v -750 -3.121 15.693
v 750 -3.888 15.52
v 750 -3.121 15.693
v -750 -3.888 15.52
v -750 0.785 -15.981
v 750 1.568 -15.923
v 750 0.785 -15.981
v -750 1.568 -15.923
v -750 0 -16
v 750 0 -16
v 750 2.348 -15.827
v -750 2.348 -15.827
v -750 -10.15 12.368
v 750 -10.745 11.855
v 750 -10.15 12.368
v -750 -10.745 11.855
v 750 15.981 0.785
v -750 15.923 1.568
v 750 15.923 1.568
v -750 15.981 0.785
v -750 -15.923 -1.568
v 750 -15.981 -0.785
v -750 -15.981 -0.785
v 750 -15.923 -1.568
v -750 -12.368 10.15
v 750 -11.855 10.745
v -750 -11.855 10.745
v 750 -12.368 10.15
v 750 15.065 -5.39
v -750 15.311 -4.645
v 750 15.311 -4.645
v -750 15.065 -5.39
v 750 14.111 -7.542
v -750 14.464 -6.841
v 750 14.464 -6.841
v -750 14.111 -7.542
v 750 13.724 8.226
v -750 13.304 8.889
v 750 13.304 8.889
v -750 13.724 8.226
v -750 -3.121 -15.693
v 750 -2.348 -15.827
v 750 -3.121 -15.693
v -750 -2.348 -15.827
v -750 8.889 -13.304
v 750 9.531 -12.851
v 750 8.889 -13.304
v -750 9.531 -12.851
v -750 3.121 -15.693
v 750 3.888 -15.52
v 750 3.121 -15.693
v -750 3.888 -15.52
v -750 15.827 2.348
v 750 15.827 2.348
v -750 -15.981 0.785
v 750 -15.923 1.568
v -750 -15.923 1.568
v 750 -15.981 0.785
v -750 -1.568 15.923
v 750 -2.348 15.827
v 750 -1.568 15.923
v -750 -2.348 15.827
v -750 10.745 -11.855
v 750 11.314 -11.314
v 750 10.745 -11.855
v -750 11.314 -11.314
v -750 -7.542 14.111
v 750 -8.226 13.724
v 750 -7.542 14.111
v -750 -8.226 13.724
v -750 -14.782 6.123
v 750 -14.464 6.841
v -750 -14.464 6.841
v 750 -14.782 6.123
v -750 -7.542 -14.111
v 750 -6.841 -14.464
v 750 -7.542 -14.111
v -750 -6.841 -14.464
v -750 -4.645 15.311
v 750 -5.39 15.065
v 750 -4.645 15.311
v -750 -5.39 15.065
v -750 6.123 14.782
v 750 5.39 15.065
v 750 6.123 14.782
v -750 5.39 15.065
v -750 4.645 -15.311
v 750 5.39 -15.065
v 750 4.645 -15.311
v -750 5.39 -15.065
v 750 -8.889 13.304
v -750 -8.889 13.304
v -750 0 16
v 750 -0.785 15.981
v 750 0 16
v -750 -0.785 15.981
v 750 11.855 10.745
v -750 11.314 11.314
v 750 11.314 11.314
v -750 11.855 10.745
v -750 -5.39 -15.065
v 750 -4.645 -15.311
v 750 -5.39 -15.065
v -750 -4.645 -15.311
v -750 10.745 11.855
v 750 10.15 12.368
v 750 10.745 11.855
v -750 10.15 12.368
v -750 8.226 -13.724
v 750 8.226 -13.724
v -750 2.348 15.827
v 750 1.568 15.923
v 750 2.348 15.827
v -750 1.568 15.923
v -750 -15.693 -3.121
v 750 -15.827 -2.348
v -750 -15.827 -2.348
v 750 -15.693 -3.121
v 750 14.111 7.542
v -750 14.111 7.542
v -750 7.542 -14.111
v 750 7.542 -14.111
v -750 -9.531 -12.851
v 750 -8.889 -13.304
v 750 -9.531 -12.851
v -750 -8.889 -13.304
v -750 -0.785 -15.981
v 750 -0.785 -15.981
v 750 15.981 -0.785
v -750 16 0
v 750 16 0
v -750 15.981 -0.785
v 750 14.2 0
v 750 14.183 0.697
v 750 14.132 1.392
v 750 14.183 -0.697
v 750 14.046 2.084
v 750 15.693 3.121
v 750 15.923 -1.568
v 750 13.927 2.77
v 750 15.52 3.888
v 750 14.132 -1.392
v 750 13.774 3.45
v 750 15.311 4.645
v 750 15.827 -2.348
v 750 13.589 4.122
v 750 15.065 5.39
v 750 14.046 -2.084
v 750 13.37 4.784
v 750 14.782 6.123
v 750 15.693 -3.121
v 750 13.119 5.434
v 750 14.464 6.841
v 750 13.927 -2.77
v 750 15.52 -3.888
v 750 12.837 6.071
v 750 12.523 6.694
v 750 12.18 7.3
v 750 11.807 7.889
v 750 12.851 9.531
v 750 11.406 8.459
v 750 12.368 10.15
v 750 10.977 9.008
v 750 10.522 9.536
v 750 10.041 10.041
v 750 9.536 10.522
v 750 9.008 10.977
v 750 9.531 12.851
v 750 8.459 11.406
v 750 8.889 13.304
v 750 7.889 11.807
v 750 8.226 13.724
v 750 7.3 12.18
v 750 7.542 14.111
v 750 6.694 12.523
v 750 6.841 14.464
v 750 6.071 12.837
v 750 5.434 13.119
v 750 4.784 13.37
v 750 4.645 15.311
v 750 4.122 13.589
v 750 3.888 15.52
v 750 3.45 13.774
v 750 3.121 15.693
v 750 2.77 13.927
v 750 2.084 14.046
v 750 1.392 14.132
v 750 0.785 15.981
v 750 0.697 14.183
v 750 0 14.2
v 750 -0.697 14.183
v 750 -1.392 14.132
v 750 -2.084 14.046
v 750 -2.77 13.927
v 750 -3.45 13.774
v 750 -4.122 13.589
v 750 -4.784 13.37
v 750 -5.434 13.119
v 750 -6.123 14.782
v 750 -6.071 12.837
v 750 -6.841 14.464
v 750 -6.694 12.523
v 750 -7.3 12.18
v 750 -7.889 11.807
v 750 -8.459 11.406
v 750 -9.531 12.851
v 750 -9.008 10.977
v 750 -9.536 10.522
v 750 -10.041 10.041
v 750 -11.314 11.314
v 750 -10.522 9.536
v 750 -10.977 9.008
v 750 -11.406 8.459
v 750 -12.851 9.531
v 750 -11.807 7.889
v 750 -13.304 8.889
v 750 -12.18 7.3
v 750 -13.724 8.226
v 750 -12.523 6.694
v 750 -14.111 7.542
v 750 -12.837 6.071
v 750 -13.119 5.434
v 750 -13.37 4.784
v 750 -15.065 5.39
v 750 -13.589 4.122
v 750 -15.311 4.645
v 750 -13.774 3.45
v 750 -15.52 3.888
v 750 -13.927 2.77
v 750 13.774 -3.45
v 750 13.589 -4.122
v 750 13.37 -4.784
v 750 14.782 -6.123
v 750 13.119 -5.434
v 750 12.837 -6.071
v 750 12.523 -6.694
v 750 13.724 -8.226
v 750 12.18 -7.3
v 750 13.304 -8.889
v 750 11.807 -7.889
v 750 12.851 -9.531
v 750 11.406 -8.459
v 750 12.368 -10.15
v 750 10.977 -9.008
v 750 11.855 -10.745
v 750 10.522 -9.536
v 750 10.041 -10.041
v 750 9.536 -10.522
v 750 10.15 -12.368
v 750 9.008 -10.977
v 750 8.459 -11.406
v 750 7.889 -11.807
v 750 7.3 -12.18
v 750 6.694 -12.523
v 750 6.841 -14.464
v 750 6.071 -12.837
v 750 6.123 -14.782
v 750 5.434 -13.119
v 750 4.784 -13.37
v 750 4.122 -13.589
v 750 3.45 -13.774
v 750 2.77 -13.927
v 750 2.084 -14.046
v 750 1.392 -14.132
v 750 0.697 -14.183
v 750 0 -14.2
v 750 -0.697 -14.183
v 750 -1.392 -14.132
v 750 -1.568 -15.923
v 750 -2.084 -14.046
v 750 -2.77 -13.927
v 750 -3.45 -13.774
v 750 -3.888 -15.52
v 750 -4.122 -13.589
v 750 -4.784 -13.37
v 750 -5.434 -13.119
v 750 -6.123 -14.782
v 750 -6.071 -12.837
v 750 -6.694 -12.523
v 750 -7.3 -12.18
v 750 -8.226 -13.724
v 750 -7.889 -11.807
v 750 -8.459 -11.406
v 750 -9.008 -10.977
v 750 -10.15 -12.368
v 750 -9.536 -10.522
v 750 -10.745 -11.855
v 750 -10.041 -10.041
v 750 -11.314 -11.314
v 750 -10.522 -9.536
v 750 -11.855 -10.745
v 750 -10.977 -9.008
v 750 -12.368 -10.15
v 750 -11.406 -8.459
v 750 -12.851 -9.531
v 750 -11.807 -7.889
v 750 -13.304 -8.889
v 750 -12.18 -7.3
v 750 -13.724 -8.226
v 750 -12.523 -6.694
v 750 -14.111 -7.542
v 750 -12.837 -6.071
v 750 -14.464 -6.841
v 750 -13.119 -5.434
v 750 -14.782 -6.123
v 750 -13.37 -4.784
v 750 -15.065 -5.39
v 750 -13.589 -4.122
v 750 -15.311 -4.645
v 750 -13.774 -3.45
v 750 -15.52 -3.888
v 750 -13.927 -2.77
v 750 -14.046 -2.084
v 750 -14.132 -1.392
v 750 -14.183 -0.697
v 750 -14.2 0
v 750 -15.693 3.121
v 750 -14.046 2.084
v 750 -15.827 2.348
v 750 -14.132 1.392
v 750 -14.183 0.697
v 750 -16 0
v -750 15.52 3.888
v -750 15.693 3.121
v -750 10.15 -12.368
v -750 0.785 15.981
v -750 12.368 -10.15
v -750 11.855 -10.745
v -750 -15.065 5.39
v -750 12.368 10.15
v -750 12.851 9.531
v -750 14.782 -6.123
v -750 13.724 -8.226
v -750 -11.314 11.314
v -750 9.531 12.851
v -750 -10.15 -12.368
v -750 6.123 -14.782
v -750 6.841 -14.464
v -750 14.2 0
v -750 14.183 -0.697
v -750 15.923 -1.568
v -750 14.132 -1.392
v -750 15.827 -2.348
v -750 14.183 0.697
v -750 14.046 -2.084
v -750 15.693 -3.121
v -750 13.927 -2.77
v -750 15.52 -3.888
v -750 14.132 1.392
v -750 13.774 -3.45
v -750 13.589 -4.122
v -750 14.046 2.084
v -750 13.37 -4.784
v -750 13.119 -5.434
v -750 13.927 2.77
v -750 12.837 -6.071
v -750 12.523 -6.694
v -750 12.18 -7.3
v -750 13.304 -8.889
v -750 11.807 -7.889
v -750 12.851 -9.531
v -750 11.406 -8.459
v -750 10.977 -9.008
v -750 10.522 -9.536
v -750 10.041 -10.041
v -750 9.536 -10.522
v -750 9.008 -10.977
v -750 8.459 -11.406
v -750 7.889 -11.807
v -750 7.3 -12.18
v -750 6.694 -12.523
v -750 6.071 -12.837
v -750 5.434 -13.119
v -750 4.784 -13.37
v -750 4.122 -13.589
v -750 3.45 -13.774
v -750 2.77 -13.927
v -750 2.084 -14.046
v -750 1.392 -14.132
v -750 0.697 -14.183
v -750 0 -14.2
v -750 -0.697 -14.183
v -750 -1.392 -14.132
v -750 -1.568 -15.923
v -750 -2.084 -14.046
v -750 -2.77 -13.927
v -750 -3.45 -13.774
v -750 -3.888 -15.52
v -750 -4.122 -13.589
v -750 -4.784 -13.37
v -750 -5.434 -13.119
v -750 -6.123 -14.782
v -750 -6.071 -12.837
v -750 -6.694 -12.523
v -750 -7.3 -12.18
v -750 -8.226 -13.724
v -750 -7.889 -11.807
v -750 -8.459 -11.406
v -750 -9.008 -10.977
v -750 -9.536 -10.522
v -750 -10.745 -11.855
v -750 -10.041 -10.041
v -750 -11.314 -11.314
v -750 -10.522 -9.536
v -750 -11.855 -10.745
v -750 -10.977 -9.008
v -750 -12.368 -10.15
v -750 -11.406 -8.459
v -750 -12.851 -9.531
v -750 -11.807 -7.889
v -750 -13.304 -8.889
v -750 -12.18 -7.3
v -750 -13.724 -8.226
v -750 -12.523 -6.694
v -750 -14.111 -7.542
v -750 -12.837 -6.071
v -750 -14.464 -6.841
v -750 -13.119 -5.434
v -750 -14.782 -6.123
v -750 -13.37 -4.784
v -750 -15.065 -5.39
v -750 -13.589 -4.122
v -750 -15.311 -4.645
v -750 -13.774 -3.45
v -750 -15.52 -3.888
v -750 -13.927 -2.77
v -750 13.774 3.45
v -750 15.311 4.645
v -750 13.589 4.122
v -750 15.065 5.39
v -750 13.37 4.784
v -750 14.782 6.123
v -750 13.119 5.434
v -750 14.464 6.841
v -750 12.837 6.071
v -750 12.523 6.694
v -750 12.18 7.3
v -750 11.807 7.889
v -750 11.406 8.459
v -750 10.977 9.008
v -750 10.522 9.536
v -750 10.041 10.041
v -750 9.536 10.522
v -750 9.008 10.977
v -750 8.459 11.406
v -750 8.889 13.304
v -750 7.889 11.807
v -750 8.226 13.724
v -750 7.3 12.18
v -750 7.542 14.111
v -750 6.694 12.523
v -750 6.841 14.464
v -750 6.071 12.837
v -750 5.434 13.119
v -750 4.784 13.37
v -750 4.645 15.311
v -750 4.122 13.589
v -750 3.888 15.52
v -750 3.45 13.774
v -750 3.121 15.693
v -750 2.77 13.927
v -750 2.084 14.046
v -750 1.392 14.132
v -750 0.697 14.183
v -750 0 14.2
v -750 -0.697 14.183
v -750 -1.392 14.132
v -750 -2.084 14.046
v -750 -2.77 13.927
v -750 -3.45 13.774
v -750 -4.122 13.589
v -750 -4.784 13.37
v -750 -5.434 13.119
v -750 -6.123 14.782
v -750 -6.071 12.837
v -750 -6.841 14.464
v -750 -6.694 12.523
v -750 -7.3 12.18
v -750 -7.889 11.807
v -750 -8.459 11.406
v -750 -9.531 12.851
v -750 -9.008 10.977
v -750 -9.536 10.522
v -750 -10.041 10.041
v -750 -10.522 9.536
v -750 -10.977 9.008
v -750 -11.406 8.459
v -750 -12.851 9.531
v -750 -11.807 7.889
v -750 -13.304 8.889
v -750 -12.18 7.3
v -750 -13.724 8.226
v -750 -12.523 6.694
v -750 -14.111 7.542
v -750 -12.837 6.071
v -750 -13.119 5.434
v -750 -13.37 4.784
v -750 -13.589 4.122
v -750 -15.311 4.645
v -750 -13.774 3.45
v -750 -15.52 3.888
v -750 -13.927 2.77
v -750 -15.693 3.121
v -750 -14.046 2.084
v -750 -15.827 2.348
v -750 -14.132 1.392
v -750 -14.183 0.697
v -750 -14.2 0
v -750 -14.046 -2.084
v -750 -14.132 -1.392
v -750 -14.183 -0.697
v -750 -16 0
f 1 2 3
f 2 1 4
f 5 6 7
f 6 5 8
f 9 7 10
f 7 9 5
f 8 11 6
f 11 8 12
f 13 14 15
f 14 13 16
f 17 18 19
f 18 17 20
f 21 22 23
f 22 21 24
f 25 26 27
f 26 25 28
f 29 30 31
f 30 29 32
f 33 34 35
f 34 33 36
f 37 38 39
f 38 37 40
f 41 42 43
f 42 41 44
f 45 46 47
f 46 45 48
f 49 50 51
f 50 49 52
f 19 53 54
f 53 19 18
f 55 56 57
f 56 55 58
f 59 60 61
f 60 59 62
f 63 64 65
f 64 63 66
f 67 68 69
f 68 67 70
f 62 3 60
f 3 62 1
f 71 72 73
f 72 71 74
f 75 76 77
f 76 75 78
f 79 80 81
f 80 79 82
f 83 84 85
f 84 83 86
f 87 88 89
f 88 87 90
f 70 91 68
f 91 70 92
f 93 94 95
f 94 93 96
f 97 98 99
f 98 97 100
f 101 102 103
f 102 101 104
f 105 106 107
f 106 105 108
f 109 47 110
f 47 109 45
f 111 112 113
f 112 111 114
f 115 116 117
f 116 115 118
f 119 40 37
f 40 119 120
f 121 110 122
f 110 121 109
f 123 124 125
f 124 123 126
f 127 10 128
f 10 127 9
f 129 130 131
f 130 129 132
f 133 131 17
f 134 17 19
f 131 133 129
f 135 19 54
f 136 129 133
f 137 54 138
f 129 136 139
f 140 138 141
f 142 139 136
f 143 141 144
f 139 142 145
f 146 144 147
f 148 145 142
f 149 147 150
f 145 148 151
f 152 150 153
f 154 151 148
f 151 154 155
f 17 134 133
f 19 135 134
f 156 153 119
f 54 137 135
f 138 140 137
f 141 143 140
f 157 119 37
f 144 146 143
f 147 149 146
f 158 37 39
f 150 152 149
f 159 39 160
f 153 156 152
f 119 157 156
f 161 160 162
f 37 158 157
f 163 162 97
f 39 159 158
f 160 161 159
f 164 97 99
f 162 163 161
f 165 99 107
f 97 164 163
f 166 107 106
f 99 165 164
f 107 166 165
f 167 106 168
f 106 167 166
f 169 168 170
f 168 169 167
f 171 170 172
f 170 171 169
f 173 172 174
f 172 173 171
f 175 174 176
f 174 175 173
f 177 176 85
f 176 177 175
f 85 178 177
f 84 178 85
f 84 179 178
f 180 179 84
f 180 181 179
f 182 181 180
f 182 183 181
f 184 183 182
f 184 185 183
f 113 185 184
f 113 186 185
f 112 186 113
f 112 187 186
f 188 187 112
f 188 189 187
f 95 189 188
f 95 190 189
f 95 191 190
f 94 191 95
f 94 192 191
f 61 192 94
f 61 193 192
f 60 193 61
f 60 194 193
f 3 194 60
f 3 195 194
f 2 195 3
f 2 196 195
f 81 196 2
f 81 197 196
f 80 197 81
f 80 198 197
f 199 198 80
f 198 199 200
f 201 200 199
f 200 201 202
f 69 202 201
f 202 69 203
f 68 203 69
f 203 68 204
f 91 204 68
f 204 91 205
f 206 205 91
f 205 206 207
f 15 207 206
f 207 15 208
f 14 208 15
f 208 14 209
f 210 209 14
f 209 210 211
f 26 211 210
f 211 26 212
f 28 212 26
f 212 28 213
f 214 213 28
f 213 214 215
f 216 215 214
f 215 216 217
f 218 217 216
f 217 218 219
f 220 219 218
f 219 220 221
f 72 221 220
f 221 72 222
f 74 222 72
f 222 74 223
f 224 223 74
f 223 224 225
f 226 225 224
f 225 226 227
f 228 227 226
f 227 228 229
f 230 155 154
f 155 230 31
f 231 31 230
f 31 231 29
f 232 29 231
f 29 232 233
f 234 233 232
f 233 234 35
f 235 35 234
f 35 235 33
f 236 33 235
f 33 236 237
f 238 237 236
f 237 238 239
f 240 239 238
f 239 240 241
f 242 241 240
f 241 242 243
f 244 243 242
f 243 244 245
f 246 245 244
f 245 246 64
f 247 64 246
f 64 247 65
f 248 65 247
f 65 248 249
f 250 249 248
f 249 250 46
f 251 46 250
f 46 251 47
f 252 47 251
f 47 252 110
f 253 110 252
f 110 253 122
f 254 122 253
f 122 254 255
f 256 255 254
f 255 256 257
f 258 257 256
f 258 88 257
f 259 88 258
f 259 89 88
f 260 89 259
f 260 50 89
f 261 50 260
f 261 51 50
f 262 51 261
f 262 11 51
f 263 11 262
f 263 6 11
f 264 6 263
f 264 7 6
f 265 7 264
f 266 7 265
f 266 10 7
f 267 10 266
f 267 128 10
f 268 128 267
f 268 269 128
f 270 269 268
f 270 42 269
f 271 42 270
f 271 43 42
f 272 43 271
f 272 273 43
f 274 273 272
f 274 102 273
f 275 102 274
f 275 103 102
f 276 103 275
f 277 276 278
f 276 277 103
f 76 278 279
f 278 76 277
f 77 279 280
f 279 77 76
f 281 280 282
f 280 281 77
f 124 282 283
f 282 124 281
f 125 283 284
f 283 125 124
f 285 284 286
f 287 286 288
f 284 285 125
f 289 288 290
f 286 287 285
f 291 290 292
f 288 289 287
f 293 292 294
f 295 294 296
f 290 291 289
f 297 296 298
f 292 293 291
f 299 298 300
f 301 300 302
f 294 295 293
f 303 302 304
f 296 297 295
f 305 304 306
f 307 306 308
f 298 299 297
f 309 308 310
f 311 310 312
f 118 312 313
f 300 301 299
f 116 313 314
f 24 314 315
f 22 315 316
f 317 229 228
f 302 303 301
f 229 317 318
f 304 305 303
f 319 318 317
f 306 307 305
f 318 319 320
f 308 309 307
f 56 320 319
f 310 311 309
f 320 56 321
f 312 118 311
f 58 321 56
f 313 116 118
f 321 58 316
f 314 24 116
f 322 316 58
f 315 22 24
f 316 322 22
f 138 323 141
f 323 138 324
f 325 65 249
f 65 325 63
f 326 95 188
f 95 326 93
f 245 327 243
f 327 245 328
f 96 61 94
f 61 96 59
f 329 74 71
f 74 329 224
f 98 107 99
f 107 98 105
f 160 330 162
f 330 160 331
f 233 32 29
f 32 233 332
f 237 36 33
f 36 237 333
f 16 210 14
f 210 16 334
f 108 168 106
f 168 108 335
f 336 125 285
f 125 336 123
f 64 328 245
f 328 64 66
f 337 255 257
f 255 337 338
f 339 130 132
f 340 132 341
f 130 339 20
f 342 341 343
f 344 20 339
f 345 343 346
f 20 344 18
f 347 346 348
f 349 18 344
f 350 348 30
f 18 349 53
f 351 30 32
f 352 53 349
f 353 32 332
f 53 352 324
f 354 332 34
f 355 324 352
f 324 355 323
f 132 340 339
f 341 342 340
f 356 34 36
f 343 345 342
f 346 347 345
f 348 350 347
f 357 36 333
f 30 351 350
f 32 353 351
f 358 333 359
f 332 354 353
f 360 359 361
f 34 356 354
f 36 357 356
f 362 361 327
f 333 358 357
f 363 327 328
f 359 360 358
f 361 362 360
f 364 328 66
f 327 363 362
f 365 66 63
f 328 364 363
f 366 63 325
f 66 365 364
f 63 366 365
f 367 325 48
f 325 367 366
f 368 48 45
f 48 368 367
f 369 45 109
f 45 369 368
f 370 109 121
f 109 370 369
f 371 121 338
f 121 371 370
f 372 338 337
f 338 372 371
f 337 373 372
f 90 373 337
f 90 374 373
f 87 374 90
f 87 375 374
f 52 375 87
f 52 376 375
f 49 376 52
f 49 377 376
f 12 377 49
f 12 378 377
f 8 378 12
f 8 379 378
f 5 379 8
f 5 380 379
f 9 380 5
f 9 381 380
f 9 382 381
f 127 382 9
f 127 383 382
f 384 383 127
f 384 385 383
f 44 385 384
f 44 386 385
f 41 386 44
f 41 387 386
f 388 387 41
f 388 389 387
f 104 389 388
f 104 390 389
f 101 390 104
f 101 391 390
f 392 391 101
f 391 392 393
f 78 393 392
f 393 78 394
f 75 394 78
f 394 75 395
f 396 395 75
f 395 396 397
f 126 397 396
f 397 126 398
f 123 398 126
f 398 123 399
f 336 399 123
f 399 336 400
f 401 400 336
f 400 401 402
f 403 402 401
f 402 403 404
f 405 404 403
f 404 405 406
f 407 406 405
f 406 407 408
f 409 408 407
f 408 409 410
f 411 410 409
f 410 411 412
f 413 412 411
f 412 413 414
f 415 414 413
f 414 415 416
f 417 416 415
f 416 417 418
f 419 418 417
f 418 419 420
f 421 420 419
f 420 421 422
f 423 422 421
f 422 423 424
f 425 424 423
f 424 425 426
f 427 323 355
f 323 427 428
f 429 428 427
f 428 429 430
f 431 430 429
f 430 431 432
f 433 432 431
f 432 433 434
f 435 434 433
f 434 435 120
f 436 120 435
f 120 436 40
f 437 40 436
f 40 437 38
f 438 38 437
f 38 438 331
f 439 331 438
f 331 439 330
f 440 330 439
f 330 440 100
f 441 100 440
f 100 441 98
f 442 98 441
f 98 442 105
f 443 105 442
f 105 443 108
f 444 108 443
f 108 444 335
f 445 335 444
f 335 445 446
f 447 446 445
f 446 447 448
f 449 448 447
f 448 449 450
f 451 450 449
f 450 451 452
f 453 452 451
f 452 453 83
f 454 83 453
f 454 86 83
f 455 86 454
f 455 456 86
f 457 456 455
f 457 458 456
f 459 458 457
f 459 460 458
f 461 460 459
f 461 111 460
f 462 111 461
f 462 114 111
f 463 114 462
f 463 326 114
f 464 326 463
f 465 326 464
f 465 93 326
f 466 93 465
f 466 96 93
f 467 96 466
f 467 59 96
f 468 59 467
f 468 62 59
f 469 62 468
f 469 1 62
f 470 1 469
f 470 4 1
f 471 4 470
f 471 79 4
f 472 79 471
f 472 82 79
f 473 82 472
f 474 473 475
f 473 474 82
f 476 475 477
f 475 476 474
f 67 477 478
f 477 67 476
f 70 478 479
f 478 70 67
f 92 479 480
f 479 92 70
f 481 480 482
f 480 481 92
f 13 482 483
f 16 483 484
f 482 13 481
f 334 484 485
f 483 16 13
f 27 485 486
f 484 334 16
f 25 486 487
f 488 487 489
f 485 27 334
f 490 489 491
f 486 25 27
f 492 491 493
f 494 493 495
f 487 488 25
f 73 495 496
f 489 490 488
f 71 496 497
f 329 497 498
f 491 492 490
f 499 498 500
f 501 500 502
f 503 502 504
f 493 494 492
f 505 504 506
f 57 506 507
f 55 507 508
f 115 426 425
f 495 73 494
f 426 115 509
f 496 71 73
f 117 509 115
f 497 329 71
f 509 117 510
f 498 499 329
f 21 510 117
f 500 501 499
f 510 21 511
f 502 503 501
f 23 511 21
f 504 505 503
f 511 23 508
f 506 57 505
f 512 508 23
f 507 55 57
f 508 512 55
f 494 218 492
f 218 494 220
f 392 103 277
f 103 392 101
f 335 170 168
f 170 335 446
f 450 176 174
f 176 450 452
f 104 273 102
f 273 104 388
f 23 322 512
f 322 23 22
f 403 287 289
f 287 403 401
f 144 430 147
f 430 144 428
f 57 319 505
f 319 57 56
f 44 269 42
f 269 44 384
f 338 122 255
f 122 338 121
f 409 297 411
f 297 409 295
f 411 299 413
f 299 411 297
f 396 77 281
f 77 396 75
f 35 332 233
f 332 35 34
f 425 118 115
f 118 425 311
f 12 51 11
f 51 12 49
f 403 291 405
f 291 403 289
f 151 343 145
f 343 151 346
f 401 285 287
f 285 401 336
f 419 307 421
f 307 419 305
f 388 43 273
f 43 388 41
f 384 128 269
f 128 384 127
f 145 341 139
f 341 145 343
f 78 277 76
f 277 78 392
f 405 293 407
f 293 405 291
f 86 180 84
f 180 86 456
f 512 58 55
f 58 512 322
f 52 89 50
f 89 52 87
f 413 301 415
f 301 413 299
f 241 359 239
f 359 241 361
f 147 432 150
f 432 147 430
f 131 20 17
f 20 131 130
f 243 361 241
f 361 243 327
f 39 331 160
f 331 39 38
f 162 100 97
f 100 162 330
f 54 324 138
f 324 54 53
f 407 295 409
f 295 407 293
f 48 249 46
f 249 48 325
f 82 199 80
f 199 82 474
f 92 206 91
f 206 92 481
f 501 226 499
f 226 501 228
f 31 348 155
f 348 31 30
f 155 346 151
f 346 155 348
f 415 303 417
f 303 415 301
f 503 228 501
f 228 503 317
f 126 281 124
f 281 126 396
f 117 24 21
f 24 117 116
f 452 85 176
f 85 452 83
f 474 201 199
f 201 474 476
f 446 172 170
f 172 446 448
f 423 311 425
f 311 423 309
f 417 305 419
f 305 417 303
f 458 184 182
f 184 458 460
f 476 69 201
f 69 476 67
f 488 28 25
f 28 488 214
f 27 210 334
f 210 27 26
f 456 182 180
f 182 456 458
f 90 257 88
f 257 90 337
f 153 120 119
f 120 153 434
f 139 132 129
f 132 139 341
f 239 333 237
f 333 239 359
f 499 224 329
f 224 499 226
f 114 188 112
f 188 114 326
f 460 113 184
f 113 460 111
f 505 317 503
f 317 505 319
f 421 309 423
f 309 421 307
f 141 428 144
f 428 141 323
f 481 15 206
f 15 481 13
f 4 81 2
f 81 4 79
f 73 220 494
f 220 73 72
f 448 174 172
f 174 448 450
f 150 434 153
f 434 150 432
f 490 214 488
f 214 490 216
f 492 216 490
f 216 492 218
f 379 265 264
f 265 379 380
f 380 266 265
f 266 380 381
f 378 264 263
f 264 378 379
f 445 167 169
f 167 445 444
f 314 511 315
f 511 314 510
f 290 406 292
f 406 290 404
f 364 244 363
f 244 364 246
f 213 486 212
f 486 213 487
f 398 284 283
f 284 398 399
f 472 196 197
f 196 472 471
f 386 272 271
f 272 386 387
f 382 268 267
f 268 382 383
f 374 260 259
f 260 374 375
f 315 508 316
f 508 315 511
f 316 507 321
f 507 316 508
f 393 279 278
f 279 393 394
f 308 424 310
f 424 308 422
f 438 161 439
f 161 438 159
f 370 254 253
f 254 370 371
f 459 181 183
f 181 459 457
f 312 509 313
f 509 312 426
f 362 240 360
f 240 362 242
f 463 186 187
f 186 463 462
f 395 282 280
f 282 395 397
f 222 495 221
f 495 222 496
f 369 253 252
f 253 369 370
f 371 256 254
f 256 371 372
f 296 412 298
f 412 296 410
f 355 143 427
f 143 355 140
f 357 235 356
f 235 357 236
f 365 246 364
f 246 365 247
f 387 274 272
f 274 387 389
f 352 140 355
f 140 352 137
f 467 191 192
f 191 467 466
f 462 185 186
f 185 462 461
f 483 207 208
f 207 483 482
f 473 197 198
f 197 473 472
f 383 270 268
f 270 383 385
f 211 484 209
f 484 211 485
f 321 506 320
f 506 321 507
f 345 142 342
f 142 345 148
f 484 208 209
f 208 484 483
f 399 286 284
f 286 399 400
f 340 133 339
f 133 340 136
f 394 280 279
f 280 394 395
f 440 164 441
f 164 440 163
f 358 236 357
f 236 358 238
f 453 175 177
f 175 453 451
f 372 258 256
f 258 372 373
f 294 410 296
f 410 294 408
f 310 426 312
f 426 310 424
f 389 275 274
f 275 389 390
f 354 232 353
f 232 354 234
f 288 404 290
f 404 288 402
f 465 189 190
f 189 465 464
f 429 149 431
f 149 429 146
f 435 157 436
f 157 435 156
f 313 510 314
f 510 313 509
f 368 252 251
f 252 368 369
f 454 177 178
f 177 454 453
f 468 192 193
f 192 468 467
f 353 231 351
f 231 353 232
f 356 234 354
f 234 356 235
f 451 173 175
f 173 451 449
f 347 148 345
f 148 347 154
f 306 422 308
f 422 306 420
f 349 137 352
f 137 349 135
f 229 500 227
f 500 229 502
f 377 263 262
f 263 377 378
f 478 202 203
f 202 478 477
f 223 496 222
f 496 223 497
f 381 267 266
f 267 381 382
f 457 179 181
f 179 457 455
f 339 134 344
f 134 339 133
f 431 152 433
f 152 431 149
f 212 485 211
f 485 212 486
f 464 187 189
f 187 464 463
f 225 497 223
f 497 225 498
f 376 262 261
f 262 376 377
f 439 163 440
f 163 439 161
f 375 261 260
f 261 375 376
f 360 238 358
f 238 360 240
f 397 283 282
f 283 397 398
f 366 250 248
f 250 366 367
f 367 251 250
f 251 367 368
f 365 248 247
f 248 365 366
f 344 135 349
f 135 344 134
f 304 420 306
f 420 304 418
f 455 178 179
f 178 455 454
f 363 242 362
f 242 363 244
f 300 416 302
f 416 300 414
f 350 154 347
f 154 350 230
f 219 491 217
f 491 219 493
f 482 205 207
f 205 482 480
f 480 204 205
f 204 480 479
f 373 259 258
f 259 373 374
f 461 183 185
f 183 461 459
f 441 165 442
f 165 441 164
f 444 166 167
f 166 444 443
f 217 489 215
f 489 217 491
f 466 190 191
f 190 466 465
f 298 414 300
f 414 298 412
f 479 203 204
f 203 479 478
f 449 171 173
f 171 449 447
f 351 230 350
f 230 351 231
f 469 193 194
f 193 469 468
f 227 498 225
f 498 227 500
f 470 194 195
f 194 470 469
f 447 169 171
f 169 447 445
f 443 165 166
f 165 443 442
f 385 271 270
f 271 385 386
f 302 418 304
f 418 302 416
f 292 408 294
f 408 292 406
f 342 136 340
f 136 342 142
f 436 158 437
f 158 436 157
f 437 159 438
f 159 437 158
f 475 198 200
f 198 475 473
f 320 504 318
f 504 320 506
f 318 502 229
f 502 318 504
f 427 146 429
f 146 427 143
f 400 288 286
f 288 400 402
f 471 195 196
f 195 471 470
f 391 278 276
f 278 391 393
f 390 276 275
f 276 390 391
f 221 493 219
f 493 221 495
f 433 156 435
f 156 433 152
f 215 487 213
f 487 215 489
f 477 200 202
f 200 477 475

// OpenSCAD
// HT 32 pipe 1500 mm

$fn = 128;

// Parameters
length_mm = 1500;            //[750:3000:10]
outer_diameter_mm = 32;      //[16:64:1]
wall_thickness_mm = 1.8;     //[0.9:3.6:0.1]
epsilon_mm = 0.2;            //[0.05:1:0.05]

// Derived
outer_r = outer_diameter_mm/2;
inner_r = max(outer_r - wall_thickness_mm, 0.01);

// Place pipe along X so standard Front/Back/Left/Right views show a long pipe (not a tiny dot)
module ht_pipe() {
    color([0.85, 0.85, 0.8])
    rotate([0, 90, 0])  // cylinder axis: Z -> X
    difference() {
        cylinder(h=length_mm, r=outer_r, center=true);
        cylinder(h=length_mm + 2*epsilon_mm, r=inner_r, center=true);
    }
}

ht_pipe();
